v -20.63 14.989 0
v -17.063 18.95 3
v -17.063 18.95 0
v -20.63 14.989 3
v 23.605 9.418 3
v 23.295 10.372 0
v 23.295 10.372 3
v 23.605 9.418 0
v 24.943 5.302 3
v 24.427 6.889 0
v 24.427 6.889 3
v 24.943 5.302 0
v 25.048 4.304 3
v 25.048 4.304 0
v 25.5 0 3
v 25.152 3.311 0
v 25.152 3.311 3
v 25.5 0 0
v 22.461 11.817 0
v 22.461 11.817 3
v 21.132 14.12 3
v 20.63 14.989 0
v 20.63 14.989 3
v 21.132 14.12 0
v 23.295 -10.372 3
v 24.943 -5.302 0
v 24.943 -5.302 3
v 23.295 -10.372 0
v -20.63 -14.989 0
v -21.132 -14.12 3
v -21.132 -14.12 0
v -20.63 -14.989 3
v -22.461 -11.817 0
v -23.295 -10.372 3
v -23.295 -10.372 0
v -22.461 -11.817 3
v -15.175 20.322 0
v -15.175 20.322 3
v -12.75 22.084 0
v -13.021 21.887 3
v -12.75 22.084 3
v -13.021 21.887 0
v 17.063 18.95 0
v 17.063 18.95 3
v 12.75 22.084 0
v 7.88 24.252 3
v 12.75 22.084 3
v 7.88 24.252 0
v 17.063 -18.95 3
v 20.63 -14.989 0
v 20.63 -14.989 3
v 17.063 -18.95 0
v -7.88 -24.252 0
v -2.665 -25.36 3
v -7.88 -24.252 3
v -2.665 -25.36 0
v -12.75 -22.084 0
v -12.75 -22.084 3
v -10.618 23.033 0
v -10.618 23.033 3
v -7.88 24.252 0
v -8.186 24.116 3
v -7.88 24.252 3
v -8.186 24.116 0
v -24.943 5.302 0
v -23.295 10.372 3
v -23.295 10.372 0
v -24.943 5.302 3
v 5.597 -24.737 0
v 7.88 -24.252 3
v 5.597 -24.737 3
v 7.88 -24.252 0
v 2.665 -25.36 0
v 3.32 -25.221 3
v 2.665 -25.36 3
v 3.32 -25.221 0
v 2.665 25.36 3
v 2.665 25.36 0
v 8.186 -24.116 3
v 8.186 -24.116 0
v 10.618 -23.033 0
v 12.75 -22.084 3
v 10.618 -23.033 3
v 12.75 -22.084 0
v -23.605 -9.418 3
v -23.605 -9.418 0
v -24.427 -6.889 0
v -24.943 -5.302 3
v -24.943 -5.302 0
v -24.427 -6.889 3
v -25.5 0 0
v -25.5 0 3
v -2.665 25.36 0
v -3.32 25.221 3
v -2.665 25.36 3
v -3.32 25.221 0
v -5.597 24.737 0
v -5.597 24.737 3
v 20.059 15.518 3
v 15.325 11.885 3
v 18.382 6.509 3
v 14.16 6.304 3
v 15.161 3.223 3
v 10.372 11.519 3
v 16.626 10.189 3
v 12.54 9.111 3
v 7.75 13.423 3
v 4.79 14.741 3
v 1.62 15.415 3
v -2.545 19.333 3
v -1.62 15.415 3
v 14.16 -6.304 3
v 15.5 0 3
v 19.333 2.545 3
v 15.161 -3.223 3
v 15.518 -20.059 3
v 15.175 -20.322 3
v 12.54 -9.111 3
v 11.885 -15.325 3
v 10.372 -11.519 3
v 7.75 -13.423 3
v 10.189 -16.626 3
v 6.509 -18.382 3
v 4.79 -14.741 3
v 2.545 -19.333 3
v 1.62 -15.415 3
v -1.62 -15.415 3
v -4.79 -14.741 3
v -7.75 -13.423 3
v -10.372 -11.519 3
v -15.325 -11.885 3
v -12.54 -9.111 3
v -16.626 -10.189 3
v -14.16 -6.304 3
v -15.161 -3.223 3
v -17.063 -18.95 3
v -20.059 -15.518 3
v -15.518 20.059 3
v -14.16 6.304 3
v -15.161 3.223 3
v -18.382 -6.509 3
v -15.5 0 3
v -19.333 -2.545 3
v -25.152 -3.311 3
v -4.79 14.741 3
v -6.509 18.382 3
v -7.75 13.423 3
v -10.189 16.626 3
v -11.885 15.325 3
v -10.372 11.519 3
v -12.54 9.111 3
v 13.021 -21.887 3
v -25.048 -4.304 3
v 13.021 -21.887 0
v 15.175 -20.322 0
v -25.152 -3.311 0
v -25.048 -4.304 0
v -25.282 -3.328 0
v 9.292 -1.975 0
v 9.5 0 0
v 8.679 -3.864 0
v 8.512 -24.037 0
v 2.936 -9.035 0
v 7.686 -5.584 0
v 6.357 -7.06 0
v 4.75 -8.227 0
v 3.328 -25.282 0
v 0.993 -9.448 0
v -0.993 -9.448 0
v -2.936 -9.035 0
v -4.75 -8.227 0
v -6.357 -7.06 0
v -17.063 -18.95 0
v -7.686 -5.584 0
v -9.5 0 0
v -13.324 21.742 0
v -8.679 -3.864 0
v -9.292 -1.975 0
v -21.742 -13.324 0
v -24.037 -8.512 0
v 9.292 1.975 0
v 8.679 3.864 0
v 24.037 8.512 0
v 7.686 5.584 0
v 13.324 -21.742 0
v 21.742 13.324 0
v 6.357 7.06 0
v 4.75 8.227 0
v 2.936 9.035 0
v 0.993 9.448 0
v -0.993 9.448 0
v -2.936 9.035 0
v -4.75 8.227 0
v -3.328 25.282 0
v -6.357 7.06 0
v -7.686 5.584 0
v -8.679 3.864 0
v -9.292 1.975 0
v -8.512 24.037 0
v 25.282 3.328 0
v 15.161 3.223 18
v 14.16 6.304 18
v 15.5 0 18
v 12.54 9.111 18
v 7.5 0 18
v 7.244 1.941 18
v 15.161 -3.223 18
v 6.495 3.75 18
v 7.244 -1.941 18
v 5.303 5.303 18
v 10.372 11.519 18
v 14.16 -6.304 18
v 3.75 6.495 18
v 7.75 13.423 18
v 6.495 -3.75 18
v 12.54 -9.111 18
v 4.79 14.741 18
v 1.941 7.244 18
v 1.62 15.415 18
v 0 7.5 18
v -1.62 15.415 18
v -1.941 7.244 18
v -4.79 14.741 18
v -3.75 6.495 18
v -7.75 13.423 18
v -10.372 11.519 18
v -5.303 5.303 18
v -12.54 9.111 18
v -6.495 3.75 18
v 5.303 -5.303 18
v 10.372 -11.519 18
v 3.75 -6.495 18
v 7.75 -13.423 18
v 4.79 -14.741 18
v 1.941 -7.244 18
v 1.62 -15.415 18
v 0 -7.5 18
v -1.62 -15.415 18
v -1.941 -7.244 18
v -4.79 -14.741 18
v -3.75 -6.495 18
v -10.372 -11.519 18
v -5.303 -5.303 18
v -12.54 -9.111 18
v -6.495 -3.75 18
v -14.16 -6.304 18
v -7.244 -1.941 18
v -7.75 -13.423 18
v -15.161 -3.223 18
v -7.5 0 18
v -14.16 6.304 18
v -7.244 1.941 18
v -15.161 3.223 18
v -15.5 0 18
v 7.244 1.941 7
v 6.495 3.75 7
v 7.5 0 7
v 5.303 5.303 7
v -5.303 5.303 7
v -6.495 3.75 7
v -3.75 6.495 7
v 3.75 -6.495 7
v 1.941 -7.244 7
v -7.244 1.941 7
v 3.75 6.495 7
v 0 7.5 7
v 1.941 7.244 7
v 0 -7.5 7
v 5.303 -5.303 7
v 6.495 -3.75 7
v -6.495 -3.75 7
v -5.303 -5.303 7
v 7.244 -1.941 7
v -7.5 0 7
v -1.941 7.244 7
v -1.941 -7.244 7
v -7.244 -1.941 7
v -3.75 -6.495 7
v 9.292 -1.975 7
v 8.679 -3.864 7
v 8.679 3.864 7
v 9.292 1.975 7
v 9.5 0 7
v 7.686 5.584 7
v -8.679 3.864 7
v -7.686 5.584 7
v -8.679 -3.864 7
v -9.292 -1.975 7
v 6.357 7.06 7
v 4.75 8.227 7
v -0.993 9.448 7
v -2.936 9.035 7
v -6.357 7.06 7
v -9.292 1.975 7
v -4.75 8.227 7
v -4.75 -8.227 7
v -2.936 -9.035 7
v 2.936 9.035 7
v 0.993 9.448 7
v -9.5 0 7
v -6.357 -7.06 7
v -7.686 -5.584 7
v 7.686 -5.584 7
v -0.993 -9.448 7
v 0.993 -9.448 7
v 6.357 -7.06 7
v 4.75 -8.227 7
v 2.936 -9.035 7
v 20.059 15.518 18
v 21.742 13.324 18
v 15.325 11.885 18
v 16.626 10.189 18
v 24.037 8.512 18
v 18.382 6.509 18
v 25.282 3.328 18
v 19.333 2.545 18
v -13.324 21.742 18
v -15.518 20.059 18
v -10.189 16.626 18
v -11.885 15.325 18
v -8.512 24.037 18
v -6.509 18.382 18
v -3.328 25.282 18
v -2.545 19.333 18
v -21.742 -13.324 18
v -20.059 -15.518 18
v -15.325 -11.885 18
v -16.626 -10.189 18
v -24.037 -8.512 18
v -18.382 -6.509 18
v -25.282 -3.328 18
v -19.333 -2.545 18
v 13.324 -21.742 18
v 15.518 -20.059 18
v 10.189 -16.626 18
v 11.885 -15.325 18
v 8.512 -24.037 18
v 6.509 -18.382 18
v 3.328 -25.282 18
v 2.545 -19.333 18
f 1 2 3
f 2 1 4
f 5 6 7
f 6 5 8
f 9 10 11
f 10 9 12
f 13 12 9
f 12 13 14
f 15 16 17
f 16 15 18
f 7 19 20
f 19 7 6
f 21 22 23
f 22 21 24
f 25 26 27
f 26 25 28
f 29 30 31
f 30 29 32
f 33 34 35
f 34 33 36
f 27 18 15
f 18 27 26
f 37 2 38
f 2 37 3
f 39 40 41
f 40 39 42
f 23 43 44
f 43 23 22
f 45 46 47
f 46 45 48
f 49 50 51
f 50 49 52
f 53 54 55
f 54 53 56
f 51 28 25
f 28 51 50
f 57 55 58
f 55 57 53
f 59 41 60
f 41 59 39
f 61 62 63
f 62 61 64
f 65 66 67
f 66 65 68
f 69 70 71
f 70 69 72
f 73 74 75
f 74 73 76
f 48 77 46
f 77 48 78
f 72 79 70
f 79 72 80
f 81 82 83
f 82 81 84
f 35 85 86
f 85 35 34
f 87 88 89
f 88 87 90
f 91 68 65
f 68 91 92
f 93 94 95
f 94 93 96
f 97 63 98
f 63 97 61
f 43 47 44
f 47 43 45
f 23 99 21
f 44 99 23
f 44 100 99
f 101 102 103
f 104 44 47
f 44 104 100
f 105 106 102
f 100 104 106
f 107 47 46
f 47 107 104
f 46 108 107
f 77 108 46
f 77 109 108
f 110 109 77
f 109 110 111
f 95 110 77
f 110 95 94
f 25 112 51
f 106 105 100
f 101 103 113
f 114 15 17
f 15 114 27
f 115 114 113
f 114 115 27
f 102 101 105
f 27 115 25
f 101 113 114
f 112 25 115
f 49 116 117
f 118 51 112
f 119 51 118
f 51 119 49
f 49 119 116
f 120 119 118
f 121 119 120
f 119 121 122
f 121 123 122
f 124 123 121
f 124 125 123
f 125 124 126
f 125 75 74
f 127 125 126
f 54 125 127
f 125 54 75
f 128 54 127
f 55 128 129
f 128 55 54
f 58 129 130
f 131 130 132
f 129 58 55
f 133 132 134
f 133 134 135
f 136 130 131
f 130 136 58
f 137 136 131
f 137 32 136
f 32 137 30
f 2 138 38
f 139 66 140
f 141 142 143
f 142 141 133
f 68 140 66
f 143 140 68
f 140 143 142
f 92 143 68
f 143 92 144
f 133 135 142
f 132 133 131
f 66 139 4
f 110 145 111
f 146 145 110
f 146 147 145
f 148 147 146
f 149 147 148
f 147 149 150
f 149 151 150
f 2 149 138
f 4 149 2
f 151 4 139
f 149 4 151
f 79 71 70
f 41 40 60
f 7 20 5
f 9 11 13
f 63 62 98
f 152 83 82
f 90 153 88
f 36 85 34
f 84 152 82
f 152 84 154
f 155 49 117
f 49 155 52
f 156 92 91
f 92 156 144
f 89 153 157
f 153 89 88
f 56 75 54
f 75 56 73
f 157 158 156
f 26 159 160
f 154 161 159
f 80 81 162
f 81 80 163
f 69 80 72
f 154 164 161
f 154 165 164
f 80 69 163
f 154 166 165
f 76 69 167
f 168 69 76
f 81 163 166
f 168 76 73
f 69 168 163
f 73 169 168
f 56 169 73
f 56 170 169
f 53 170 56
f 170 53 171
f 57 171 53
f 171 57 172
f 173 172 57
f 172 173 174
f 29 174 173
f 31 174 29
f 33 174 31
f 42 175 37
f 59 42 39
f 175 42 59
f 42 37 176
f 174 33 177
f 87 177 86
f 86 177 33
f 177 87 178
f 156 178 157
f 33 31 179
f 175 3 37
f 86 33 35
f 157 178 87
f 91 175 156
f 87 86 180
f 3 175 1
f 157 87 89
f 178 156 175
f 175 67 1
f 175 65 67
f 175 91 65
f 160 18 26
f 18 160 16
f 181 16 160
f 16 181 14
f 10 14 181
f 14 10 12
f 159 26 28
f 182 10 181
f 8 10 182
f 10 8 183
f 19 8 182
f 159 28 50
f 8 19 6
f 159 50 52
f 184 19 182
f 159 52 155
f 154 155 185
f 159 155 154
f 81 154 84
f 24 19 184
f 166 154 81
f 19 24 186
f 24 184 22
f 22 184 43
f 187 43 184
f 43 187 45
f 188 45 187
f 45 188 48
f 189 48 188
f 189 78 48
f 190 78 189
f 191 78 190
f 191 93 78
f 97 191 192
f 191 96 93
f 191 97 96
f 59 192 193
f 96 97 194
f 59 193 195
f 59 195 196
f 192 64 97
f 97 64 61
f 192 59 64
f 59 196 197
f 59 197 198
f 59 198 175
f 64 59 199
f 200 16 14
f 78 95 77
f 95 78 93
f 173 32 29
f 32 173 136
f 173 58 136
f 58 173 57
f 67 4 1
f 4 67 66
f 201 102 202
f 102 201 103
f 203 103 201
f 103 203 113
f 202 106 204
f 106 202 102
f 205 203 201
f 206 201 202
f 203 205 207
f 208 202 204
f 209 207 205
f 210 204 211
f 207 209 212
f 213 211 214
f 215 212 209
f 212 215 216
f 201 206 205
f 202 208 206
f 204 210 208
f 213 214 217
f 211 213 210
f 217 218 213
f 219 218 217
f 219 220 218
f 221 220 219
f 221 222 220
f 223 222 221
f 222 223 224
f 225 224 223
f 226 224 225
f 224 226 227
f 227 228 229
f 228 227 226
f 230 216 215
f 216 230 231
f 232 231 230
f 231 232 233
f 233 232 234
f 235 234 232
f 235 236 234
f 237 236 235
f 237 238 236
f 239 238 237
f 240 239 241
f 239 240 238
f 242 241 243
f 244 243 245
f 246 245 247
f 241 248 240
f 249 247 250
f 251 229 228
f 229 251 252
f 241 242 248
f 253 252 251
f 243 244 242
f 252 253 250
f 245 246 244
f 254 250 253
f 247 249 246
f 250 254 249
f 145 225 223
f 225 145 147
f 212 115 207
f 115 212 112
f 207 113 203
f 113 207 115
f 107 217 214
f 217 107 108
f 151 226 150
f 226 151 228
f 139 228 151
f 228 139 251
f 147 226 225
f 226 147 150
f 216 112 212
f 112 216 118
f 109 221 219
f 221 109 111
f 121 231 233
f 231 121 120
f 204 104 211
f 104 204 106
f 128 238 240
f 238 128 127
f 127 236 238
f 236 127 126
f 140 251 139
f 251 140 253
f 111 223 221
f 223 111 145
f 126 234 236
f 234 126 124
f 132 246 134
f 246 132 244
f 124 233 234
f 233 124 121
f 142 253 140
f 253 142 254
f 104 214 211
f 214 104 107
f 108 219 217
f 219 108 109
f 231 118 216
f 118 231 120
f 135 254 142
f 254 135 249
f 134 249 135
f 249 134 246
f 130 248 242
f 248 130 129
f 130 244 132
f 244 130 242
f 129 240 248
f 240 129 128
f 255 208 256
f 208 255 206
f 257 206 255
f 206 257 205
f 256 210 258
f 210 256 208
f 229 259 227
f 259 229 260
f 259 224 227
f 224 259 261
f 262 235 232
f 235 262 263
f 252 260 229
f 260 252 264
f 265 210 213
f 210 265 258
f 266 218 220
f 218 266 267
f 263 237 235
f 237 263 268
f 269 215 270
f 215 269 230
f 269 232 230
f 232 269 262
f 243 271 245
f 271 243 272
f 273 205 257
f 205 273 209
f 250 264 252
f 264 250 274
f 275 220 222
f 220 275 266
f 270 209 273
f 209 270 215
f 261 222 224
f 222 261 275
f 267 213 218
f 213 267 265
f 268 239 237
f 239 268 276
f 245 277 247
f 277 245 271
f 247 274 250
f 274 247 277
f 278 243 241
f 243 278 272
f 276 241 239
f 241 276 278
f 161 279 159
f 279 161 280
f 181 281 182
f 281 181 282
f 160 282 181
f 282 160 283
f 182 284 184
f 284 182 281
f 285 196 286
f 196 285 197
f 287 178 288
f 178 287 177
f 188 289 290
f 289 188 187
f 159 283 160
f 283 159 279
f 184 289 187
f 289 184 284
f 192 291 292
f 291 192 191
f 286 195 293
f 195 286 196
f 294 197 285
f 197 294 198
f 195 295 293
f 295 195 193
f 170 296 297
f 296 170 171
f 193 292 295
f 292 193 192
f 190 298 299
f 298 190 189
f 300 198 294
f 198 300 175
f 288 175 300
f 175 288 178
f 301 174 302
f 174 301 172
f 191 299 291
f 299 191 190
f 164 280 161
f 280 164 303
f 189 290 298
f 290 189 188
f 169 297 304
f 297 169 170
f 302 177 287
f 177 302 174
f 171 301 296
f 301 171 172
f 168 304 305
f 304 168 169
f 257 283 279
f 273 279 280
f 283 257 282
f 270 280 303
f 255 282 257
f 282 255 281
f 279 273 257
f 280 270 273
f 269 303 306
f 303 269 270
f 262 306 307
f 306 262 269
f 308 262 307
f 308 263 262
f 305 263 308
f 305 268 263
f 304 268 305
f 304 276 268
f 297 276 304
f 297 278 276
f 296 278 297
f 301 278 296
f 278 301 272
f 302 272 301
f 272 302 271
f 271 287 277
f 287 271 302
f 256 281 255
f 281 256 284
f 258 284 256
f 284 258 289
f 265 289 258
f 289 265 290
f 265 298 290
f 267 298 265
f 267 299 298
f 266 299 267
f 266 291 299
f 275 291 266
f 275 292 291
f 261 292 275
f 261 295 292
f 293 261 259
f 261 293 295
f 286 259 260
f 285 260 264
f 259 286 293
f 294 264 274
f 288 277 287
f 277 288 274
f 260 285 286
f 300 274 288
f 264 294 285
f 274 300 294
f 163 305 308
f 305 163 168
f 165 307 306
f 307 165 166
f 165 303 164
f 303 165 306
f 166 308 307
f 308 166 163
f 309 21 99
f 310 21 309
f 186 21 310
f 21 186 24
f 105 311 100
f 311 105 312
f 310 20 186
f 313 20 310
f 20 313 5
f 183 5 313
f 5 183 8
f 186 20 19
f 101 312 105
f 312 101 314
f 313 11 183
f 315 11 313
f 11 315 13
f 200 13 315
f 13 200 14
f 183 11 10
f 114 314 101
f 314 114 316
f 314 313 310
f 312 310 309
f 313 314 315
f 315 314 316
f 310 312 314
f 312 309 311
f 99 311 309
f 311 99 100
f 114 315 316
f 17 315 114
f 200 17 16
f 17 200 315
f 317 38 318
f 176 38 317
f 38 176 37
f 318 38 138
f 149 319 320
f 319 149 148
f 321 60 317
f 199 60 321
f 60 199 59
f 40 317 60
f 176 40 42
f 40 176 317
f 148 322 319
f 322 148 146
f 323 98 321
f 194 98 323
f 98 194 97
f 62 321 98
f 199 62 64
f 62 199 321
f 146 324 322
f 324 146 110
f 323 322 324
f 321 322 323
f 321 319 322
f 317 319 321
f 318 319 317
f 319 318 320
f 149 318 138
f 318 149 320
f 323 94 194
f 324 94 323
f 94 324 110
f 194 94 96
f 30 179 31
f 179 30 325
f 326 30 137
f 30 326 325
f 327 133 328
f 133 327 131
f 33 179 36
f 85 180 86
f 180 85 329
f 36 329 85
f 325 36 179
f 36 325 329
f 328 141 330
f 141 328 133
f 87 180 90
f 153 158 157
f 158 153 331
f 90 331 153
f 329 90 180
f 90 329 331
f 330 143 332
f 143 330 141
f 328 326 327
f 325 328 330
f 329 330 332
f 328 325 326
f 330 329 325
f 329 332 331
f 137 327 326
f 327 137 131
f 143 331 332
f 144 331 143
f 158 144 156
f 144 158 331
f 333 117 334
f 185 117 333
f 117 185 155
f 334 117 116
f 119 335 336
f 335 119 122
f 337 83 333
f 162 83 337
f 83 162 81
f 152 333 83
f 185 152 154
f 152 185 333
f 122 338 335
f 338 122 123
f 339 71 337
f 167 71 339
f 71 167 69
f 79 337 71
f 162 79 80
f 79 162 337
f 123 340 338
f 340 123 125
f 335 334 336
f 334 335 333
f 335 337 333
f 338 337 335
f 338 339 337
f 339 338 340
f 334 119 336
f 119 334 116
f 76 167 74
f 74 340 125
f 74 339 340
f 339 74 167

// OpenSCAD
//Thanks to Jeremie Francois for his OpenSCAD tutorial @ http://www.tridimake.com/2014/09/how-to-use-openscad-tricks-and-tips-to.html

part_d=51; //outside diameter of entire part
prong_height=18;
spool_cylinder_height=18;
spool_cylinder_diameter=31;
bearing_diameter=19;
bearing_thickness=7;
bearing_lip_width=2;
bottom_thickness=3;
prong_thickness=6;
prong_arc_deg=30; //this has to be less than 45

difference()
{
	difference()
	{
		union()
		{
			cylinder(r=part_d/2,h=bottom_thickness);  //base
			cylinder(r=spool_cylinder_diameter/2,h=18);  //what fits inside the spool
		}
		translate([0,0,-.01]) //start a bit below
			cylinder(r=bearing_diameter/2 - bearing_lip_width,h=spool_cylinder_height +.01 +.01); //protrude from both faces
	}
	
	translate([0,0,-.01]) //start a bit below
		cylinder(r=bearing_diameter/2,h=bearing_thickness + .01, center=false); //set the bearing lip
}
	

for(r=[(45 - prong_arc_deg)/2:90:359]) //fit the prong arc evenly within each 45 deg segment of the circle
	rotate([0,0,r])
		intersection()
		{
			rotate_extrude(convexity=10)
				translate([part_d/2 - prong_thickness,0,0])
					square([prong_thickness,prong_height]);
			prong(angle=prong_arc_deg);
		}

 module prong(angle, extent=100, height=100, center=true)
{
	module prong_wall()
	{
		translate([0,0, (center==true ? -height/2: 0)])
			cube([extent, 0.1, height]);
	}
	
	hull()
	{
		prong_wall();
		rotate([0,0,angle])
			prong_wall();
	}
	
	
}
